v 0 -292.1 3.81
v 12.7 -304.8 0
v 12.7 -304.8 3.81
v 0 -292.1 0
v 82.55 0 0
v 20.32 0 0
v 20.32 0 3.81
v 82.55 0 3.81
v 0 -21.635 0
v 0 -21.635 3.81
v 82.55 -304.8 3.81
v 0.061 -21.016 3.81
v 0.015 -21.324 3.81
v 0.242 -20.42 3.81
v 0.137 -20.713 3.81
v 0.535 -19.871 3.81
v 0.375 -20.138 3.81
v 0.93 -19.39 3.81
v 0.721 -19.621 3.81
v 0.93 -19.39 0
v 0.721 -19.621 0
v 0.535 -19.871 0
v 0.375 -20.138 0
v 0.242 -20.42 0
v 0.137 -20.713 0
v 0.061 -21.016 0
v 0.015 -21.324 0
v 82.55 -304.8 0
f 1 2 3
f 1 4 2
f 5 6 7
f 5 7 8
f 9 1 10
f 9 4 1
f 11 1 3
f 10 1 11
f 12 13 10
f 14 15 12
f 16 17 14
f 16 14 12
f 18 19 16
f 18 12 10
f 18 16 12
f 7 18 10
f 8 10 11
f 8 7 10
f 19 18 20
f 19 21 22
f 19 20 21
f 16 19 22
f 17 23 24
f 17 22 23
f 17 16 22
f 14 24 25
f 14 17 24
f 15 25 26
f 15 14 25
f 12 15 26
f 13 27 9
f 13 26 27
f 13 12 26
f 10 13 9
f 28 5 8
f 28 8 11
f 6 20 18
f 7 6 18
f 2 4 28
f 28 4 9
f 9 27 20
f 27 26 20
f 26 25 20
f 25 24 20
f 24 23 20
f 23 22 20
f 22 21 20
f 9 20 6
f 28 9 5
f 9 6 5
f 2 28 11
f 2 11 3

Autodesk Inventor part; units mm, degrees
ref_plane "YZ Plane" through (0, 0, 0) normal (1, 0, 0) x (0, 1, 0)
ref_plane "XZ Plane" through (0, 0, 0) normal (0, 1, 0) x (-1, 0, 0)
ref_plane "XY Plane" through (0, 0, 0) normal (0, 0, 1) x (1, 0, 0)
sketch "Sketch1" plane through (0, 0, 0) normal (0, 0, 1) x (1, 0, 0)
  line L0 (0, 0) -> (82.55, 0)
  line L1 (82.55, 0) -> (82.55, -304.8)
  line L2 (82.55, -304.8) -> (0, -304.8)
  line L3 (0, -304.8) -> (0, 0)
  dimension "d0" = 82.55
  dimension "d1" = 304.8
extrude "Extrusion1" add sketch "Sketch1" along normal blind 3.81
chamfer "Chamfer1" distance 12.7 angle 45 1 edges at (0, -304.8, 1.905)
chamfer "Chamfer2" distance 20.32 angle 45 1 edges at (0, 0, 1.905)
fillet "Fillet1" radius 3.175 1 edges at (0, -20.32, 1.905)
properties part number "Backstopright"
